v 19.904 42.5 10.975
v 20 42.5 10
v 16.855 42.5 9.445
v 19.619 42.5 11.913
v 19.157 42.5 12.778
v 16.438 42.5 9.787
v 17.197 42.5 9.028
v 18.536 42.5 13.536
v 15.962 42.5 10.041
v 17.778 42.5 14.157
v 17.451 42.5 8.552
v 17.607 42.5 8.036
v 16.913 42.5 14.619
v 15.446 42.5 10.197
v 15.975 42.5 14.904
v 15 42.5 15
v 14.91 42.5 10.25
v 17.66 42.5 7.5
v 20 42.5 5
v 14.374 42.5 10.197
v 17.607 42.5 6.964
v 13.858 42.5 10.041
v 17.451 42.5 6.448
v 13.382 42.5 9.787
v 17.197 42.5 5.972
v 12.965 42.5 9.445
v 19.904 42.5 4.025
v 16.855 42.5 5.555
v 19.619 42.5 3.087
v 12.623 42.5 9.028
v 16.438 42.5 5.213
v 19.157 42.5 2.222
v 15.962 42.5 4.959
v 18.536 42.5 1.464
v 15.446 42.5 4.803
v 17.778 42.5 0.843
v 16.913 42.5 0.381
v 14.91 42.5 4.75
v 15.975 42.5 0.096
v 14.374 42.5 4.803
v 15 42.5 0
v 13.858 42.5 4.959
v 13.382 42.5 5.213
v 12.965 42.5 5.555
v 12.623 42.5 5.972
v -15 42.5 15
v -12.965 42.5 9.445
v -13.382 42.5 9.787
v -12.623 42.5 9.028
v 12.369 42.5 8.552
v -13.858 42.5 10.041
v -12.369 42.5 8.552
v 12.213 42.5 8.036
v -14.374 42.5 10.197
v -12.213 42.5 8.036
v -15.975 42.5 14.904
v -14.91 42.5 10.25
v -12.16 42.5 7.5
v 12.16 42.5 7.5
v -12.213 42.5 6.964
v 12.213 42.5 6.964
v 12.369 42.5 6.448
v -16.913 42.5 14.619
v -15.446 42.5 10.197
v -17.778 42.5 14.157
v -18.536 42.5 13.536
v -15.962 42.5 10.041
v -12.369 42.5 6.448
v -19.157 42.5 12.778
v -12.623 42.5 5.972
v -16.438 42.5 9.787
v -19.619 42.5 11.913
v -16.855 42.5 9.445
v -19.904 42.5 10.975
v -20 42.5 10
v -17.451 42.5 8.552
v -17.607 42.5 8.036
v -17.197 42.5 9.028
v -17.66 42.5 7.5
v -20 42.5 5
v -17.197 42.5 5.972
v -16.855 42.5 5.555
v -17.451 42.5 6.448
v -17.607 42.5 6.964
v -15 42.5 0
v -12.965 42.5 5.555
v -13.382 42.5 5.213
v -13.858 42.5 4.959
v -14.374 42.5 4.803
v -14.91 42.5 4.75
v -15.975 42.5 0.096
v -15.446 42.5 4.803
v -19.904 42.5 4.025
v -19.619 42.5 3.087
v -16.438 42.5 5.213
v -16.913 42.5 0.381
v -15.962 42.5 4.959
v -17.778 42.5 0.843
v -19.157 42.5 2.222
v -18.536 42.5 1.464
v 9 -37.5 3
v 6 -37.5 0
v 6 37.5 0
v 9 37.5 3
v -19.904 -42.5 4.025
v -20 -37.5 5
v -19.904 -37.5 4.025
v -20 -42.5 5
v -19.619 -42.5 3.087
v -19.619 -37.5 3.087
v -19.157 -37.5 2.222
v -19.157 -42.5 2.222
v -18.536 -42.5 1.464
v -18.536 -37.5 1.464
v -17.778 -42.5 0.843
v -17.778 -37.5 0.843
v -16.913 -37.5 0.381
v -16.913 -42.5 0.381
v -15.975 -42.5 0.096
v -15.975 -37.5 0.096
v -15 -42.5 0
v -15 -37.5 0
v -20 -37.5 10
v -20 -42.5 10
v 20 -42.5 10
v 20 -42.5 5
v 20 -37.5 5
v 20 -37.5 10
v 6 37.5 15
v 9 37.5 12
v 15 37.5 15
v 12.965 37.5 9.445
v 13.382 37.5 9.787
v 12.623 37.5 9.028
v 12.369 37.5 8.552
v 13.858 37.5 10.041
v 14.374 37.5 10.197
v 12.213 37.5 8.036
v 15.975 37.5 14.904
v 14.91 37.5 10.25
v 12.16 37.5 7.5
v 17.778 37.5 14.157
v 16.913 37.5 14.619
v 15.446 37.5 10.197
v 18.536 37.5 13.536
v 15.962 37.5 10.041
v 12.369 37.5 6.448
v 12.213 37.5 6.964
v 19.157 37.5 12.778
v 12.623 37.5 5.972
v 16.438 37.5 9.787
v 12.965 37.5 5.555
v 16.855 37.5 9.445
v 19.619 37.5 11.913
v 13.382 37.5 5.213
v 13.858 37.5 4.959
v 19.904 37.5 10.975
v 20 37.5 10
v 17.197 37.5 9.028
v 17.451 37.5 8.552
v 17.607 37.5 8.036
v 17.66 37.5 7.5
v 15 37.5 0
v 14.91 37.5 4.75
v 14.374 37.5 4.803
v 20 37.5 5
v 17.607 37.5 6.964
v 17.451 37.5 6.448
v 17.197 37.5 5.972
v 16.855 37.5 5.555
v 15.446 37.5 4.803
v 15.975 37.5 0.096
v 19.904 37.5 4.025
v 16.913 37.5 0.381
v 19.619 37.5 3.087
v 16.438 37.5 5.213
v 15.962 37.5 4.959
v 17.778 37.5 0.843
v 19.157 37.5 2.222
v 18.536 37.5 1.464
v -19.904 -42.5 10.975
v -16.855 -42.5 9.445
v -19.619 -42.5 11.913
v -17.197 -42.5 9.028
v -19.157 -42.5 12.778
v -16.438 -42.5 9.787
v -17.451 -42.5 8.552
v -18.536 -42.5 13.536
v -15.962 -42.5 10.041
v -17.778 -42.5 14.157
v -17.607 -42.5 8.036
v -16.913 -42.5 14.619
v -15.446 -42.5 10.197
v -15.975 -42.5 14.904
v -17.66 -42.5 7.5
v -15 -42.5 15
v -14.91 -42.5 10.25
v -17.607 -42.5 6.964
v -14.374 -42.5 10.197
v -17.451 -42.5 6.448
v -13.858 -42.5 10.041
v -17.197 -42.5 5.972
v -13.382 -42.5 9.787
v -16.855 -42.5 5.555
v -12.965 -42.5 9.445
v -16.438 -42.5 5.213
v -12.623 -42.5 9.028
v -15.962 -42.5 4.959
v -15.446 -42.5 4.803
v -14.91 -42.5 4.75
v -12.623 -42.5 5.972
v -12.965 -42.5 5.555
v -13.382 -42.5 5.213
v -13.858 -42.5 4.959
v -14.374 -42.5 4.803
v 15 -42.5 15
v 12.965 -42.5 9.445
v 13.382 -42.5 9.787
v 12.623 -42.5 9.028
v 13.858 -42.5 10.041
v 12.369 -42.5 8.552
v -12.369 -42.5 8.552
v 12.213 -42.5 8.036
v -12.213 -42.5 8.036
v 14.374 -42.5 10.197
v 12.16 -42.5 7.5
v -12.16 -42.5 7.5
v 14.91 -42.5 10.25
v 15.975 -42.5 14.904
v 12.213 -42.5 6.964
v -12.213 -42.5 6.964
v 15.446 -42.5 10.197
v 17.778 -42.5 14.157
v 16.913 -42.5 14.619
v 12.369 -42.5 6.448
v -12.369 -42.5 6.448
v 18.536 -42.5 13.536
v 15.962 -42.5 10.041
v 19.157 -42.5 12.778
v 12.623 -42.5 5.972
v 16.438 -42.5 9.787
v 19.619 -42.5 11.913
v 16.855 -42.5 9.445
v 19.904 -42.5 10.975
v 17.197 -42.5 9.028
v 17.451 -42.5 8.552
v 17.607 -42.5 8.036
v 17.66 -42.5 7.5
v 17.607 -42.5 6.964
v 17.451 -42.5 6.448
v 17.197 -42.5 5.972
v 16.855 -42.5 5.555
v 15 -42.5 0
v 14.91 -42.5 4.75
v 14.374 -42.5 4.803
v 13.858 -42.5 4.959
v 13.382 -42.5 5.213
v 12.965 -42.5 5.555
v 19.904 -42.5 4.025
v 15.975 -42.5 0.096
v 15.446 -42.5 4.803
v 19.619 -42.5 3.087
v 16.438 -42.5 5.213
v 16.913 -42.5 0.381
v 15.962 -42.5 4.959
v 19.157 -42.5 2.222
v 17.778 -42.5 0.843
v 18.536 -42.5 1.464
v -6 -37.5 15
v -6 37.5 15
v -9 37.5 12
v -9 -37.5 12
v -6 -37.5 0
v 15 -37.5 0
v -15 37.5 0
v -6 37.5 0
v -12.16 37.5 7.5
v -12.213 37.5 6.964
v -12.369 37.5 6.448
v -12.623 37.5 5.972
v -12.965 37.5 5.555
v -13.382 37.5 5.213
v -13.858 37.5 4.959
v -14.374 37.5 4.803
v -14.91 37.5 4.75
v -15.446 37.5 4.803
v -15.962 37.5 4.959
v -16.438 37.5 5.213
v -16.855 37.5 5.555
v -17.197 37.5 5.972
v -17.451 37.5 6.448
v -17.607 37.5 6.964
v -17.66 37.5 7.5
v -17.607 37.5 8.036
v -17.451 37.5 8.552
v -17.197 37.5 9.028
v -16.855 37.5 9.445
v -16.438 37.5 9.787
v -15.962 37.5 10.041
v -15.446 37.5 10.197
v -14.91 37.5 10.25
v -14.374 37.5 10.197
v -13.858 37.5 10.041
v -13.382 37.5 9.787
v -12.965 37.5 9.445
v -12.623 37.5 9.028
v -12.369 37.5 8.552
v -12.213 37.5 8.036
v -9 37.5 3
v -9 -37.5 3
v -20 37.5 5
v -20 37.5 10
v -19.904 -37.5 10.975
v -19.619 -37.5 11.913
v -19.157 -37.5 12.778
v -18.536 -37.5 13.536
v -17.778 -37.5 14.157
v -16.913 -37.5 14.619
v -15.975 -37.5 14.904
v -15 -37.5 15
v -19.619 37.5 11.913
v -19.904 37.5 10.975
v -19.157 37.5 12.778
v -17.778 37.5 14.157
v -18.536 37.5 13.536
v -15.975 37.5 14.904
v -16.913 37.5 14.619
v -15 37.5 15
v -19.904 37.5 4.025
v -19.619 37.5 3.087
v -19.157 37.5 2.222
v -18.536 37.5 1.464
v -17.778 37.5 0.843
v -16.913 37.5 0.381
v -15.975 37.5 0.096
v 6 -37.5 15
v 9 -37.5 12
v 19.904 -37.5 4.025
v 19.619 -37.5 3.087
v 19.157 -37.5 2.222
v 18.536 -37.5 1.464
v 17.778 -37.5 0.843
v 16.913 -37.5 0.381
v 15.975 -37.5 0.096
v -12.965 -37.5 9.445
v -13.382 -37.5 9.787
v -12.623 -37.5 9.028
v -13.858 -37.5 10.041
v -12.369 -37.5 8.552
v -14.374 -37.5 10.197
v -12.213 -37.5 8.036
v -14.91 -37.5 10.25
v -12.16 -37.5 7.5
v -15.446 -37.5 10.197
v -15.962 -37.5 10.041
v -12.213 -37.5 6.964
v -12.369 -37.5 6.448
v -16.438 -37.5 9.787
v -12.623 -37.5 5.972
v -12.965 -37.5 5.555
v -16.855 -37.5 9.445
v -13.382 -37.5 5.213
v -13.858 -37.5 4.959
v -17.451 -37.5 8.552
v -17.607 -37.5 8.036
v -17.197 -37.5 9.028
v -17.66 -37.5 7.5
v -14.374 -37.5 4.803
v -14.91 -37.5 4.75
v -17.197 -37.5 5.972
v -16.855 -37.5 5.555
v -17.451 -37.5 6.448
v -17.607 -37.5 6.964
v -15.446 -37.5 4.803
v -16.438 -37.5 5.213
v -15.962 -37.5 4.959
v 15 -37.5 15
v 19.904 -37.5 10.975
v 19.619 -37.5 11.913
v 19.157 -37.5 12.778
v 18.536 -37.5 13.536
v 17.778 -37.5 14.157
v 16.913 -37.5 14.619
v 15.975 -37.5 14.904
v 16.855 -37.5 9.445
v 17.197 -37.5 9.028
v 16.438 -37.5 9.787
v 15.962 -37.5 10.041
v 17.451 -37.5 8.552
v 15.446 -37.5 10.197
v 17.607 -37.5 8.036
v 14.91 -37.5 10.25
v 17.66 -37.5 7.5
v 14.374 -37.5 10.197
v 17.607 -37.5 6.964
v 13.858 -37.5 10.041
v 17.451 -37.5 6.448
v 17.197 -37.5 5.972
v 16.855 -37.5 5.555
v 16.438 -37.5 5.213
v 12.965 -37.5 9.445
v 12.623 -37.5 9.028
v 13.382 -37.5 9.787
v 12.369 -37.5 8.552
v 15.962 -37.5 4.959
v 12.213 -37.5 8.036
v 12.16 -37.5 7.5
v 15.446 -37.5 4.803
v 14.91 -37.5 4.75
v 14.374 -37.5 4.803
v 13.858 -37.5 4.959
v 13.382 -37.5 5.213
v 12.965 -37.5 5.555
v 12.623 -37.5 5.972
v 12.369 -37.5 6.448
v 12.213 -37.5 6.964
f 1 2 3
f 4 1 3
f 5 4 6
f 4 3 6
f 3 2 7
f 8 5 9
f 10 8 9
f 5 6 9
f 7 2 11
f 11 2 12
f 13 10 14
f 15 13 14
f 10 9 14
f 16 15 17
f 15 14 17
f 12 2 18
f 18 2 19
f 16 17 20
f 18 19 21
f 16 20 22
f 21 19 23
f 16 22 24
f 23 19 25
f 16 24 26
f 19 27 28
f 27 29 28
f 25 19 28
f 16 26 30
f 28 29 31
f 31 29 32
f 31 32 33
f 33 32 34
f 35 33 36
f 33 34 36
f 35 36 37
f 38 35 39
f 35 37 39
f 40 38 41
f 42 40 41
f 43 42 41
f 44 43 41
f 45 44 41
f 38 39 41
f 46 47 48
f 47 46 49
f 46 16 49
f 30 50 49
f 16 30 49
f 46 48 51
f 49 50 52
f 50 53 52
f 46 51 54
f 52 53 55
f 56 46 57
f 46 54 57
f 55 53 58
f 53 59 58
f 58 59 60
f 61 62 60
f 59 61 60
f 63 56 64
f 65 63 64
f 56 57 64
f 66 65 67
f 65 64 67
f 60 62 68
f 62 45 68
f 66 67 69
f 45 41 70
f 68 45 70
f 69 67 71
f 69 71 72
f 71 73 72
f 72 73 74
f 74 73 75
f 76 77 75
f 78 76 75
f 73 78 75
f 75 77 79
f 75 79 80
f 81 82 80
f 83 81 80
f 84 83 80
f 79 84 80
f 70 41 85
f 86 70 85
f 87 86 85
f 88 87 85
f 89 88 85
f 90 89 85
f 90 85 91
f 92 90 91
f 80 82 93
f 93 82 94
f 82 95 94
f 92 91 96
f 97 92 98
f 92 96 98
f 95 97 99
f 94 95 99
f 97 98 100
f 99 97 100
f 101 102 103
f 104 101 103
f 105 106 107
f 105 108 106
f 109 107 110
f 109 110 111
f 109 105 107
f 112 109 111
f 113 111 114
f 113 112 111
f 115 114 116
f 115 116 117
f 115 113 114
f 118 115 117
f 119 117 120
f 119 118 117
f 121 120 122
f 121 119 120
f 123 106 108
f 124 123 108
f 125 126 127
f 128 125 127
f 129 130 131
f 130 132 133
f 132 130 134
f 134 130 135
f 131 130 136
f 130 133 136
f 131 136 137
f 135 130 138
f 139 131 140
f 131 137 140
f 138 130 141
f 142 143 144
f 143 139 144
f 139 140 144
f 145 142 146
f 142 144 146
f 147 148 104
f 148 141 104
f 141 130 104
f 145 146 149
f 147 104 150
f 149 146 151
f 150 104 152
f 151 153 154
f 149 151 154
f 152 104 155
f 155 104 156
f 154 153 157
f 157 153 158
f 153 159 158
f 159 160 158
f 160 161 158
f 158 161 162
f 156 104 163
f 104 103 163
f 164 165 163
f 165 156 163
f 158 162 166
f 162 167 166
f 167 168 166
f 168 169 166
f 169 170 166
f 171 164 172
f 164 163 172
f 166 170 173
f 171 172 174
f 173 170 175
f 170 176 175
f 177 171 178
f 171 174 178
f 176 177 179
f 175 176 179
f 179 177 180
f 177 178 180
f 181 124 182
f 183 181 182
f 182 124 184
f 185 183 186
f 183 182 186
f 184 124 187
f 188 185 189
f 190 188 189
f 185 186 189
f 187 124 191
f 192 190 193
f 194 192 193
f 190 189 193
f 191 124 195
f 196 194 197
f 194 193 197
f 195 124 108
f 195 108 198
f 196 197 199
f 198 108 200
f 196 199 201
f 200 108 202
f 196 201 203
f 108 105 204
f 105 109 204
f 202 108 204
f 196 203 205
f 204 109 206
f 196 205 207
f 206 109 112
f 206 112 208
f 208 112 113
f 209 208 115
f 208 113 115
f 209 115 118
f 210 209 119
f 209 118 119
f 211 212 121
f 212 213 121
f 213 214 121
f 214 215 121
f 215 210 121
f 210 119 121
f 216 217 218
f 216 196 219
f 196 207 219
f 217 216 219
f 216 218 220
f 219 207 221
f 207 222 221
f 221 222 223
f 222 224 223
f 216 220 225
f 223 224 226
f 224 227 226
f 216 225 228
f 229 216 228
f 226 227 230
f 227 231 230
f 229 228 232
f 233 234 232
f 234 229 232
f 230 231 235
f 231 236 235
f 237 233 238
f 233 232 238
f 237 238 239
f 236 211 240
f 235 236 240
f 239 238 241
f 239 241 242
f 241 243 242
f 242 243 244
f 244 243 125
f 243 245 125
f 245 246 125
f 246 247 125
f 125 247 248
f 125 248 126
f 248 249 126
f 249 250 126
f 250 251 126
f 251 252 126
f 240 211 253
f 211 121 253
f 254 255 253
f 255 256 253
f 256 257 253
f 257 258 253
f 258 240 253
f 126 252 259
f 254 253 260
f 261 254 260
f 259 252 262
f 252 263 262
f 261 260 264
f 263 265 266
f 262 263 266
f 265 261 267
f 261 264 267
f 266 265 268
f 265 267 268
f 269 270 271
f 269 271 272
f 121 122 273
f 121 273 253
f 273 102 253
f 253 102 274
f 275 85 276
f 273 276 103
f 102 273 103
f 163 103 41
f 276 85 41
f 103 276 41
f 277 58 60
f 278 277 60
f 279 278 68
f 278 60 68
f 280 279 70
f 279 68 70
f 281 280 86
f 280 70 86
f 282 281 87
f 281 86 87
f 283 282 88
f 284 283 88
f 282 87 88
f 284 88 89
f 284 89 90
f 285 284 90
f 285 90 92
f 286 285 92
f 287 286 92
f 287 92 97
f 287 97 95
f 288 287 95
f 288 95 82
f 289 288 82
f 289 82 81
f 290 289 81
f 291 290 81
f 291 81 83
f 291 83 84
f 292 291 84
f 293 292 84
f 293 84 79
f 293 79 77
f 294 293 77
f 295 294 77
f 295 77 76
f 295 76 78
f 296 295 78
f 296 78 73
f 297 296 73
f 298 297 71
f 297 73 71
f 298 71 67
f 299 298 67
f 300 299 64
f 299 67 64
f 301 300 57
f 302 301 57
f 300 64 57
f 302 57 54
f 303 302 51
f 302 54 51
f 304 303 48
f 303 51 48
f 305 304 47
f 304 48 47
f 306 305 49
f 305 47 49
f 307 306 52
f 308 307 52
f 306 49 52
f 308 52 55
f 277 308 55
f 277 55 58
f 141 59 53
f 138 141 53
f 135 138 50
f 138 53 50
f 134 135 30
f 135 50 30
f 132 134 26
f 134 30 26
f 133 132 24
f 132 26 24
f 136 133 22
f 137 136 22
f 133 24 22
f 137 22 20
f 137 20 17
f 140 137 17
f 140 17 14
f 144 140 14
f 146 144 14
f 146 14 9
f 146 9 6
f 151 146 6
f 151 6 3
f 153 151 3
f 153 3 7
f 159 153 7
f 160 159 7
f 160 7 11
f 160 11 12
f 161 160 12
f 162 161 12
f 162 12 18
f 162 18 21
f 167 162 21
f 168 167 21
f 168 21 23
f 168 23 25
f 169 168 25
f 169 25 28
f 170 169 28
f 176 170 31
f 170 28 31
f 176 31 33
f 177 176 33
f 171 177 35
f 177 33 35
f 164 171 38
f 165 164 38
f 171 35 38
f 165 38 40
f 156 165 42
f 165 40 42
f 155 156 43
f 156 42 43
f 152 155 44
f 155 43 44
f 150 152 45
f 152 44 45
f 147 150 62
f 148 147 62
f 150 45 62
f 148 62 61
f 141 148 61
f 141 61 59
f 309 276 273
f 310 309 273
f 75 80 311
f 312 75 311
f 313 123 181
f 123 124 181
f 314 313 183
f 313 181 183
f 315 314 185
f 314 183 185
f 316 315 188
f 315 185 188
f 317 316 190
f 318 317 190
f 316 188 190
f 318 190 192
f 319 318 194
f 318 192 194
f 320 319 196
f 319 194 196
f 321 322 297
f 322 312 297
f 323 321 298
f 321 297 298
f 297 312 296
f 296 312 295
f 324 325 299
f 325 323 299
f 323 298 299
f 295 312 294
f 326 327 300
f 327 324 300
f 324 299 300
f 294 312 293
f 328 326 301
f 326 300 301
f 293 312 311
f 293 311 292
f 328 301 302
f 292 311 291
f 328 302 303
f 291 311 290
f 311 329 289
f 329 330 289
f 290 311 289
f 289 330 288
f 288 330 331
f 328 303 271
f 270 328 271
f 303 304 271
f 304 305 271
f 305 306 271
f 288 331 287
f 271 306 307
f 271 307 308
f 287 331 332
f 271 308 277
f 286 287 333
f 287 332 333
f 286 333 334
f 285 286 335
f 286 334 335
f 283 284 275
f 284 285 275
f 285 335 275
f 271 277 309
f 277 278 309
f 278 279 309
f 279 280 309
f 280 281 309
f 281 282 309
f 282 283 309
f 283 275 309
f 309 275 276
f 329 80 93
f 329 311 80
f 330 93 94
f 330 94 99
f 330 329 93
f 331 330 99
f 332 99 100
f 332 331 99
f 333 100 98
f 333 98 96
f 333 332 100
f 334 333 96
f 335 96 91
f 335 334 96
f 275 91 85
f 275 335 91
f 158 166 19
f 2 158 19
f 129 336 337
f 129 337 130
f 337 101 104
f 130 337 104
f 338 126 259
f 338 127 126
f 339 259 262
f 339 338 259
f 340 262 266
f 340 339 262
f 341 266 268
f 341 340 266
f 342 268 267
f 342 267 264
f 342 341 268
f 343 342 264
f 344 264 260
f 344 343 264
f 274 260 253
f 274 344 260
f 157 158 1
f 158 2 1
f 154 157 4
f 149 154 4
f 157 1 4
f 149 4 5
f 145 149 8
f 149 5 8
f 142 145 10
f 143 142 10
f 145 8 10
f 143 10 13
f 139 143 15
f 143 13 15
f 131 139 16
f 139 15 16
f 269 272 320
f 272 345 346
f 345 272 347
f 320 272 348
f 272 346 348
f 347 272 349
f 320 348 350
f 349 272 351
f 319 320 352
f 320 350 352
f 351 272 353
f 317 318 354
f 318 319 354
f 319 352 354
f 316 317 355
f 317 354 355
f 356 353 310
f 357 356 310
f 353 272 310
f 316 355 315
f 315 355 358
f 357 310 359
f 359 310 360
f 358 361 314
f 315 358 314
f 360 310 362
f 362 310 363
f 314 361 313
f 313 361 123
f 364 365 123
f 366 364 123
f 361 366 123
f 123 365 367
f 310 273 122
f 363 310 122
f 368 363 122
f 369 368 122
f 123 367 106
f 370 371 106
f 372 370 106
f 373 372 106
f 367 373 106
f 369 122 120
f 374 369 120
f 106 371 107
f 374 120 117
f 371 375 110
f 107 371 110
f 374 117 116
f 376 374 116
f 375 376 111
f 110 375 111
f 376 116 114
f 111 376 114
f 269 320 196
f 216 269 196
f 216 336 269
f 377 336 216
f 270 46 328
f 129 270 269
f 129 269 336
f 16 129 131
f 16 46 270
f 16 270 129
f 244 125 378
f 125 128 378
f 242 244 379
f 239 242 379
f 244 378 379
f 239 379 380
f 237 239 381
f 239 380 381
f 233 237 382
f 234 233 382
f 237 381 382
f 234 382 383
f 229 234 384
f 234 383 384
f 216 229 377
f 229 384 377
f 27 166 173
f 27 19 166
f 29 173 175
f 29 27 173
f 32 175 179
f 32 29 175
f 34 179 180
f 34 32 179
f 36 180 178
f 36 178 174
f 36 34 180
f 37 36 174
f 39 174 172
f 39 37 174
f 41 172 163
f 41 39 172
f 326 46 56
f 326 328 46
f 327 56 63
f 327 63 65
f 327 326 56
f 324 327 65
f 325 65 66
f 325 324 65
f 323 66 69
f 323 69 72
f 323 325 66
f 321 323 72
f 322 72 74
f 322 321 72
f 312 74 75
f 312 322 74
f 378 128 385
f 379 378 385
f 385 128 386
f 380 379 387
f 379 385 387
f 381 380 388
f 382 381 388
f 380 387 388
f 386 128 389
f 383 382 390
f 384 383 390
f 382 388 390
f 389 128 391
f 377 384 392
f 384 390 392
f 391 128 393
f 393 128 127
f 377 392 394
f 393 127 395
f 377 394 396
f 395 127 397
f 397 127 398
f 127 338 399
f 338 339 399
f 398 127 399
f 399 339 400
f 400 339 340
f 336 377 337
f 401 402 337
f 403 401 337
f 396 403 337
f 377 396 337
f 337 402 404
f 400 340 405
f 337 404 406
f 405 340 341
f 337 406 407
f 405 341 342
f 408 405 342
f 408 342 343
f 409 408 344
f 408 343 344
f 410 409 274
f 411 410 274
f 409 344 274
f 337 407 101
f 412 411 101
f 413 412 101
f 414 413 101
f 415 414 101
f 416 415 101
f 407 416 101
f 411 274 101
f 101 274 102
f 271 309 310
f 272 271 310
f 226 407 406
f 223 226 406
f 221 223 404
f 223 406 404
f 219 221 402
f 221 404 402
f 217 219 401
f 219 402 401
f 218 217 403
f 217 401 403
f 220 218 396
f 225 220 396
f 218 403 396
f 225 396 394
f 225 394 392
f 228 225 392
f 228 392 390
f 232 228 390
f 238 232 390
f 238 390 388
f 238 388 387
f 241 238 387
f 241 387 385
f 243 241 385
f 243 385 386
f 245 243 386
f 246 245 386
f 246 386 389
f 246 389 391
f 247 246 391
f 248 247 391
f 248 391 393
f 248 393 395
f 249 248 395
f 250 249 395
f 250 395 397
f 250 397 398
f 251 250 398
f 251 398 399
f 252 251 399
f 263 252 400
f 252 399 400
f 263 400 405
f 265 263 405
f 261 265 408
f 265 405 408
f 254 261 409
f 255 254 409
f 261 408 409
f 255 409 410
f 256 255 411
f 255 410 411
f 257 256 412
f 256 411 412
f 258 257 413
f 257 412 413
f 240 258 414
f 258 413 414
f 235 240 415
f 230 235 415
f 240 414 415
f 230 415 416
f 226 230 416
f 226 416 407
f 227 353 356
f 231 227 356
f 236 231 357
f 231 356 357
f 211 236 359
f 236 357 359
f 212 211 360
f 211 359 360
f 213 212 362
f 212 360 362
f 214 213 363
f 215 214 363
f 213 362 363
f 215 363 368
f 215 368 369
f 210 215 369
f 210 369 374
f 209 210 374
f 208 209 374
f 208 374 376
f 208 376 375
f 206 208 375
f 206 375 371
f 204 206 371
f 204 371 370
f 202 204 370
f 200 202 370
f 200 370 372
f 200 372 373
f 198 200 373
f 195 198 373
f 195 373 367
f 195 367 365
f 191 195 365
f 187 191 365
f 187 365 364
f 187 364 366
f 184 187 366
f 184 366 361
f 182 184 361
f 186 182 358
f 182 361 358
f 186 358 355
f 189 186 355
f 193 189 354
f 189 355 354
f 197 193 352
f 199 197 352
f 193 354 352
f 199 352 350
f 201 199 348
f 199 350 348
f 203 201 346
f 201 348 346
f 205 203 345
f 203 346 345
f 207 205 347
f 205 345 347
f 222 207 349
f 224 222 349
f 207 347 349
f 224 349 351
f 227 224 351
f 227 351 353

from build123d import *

# Parameters (mm, degrees)
F1_DEPTH = 15
F2_SIZE  = 3
F3_R     = 5
F4_R     = 2.75
F5_DEPTH = 150


with BuildPart() as f1:
    # F0 (on Top) → F1 (new body)
    with BuildSketch(Plane.XY):
        Polygon((0, 37.5), (9, 37.5), (20, 37.5), (20, 42.5), (-20, 42.5), (-20, 37.5), (-9, 37.5), align=None)
        Polygon((9, -37.5), (9, 37.5), (0, 37.5), (-9, 37.5), (-9, -37.5), (0, -37.5), align=None)
        Polygon((20, -37.5), (9, -37.5), (0, -37.5), (-9, -37.5), (-20, -37.5), (-20, -42.5), (20, -42.5), align=None)
    extrude(amount=F1_DEPTH)

    # F2
    f2_edges = [f1.edges().sort_by_distance(p)[0] for p in [
        (9, 0, 0),
        (-9, 0, 0),
        (-9, 0, 15),
        (9, 0, 15),
    ]]
    chamfer(f2_edges, length=F2_SIZE)

    # F3
    f3_edges = [f1.edges().sort_by_distance(p)[0] for p in [
        (20, -40, 15),
        (-20, -40, 0),
        (-20, -40, 15),
        (20, -40, 0),
        (-20, 40, 15),
        (-20, 40, 0),
        (20, 40, 0),
        (20, 40, 15),
    ]]
    fillet(f3_edges, radius=F3_R)

    # F4 (on face) → F5 (cut)
    with BuildSketch(Plane(origin=(0, 42.5, 0), x_dir=(-1, 0, 0), z_dir=(0, 1, 0))):
        with BuildLine():
            ThreePointArc((17.66, 7.5), (14.91, 10.25), (12.16, 7.5))
            ThreePointArc((12.16, 7.5), (14.91, 4.75), (17.66, 7.5))
        make_face()
        with Locations((-14.91, 7.5)):
            Circle(F4_R)
    extrude(amount=-F5_DEPTH, mode=Mode.SUBTRACT)


solid = f1.part
